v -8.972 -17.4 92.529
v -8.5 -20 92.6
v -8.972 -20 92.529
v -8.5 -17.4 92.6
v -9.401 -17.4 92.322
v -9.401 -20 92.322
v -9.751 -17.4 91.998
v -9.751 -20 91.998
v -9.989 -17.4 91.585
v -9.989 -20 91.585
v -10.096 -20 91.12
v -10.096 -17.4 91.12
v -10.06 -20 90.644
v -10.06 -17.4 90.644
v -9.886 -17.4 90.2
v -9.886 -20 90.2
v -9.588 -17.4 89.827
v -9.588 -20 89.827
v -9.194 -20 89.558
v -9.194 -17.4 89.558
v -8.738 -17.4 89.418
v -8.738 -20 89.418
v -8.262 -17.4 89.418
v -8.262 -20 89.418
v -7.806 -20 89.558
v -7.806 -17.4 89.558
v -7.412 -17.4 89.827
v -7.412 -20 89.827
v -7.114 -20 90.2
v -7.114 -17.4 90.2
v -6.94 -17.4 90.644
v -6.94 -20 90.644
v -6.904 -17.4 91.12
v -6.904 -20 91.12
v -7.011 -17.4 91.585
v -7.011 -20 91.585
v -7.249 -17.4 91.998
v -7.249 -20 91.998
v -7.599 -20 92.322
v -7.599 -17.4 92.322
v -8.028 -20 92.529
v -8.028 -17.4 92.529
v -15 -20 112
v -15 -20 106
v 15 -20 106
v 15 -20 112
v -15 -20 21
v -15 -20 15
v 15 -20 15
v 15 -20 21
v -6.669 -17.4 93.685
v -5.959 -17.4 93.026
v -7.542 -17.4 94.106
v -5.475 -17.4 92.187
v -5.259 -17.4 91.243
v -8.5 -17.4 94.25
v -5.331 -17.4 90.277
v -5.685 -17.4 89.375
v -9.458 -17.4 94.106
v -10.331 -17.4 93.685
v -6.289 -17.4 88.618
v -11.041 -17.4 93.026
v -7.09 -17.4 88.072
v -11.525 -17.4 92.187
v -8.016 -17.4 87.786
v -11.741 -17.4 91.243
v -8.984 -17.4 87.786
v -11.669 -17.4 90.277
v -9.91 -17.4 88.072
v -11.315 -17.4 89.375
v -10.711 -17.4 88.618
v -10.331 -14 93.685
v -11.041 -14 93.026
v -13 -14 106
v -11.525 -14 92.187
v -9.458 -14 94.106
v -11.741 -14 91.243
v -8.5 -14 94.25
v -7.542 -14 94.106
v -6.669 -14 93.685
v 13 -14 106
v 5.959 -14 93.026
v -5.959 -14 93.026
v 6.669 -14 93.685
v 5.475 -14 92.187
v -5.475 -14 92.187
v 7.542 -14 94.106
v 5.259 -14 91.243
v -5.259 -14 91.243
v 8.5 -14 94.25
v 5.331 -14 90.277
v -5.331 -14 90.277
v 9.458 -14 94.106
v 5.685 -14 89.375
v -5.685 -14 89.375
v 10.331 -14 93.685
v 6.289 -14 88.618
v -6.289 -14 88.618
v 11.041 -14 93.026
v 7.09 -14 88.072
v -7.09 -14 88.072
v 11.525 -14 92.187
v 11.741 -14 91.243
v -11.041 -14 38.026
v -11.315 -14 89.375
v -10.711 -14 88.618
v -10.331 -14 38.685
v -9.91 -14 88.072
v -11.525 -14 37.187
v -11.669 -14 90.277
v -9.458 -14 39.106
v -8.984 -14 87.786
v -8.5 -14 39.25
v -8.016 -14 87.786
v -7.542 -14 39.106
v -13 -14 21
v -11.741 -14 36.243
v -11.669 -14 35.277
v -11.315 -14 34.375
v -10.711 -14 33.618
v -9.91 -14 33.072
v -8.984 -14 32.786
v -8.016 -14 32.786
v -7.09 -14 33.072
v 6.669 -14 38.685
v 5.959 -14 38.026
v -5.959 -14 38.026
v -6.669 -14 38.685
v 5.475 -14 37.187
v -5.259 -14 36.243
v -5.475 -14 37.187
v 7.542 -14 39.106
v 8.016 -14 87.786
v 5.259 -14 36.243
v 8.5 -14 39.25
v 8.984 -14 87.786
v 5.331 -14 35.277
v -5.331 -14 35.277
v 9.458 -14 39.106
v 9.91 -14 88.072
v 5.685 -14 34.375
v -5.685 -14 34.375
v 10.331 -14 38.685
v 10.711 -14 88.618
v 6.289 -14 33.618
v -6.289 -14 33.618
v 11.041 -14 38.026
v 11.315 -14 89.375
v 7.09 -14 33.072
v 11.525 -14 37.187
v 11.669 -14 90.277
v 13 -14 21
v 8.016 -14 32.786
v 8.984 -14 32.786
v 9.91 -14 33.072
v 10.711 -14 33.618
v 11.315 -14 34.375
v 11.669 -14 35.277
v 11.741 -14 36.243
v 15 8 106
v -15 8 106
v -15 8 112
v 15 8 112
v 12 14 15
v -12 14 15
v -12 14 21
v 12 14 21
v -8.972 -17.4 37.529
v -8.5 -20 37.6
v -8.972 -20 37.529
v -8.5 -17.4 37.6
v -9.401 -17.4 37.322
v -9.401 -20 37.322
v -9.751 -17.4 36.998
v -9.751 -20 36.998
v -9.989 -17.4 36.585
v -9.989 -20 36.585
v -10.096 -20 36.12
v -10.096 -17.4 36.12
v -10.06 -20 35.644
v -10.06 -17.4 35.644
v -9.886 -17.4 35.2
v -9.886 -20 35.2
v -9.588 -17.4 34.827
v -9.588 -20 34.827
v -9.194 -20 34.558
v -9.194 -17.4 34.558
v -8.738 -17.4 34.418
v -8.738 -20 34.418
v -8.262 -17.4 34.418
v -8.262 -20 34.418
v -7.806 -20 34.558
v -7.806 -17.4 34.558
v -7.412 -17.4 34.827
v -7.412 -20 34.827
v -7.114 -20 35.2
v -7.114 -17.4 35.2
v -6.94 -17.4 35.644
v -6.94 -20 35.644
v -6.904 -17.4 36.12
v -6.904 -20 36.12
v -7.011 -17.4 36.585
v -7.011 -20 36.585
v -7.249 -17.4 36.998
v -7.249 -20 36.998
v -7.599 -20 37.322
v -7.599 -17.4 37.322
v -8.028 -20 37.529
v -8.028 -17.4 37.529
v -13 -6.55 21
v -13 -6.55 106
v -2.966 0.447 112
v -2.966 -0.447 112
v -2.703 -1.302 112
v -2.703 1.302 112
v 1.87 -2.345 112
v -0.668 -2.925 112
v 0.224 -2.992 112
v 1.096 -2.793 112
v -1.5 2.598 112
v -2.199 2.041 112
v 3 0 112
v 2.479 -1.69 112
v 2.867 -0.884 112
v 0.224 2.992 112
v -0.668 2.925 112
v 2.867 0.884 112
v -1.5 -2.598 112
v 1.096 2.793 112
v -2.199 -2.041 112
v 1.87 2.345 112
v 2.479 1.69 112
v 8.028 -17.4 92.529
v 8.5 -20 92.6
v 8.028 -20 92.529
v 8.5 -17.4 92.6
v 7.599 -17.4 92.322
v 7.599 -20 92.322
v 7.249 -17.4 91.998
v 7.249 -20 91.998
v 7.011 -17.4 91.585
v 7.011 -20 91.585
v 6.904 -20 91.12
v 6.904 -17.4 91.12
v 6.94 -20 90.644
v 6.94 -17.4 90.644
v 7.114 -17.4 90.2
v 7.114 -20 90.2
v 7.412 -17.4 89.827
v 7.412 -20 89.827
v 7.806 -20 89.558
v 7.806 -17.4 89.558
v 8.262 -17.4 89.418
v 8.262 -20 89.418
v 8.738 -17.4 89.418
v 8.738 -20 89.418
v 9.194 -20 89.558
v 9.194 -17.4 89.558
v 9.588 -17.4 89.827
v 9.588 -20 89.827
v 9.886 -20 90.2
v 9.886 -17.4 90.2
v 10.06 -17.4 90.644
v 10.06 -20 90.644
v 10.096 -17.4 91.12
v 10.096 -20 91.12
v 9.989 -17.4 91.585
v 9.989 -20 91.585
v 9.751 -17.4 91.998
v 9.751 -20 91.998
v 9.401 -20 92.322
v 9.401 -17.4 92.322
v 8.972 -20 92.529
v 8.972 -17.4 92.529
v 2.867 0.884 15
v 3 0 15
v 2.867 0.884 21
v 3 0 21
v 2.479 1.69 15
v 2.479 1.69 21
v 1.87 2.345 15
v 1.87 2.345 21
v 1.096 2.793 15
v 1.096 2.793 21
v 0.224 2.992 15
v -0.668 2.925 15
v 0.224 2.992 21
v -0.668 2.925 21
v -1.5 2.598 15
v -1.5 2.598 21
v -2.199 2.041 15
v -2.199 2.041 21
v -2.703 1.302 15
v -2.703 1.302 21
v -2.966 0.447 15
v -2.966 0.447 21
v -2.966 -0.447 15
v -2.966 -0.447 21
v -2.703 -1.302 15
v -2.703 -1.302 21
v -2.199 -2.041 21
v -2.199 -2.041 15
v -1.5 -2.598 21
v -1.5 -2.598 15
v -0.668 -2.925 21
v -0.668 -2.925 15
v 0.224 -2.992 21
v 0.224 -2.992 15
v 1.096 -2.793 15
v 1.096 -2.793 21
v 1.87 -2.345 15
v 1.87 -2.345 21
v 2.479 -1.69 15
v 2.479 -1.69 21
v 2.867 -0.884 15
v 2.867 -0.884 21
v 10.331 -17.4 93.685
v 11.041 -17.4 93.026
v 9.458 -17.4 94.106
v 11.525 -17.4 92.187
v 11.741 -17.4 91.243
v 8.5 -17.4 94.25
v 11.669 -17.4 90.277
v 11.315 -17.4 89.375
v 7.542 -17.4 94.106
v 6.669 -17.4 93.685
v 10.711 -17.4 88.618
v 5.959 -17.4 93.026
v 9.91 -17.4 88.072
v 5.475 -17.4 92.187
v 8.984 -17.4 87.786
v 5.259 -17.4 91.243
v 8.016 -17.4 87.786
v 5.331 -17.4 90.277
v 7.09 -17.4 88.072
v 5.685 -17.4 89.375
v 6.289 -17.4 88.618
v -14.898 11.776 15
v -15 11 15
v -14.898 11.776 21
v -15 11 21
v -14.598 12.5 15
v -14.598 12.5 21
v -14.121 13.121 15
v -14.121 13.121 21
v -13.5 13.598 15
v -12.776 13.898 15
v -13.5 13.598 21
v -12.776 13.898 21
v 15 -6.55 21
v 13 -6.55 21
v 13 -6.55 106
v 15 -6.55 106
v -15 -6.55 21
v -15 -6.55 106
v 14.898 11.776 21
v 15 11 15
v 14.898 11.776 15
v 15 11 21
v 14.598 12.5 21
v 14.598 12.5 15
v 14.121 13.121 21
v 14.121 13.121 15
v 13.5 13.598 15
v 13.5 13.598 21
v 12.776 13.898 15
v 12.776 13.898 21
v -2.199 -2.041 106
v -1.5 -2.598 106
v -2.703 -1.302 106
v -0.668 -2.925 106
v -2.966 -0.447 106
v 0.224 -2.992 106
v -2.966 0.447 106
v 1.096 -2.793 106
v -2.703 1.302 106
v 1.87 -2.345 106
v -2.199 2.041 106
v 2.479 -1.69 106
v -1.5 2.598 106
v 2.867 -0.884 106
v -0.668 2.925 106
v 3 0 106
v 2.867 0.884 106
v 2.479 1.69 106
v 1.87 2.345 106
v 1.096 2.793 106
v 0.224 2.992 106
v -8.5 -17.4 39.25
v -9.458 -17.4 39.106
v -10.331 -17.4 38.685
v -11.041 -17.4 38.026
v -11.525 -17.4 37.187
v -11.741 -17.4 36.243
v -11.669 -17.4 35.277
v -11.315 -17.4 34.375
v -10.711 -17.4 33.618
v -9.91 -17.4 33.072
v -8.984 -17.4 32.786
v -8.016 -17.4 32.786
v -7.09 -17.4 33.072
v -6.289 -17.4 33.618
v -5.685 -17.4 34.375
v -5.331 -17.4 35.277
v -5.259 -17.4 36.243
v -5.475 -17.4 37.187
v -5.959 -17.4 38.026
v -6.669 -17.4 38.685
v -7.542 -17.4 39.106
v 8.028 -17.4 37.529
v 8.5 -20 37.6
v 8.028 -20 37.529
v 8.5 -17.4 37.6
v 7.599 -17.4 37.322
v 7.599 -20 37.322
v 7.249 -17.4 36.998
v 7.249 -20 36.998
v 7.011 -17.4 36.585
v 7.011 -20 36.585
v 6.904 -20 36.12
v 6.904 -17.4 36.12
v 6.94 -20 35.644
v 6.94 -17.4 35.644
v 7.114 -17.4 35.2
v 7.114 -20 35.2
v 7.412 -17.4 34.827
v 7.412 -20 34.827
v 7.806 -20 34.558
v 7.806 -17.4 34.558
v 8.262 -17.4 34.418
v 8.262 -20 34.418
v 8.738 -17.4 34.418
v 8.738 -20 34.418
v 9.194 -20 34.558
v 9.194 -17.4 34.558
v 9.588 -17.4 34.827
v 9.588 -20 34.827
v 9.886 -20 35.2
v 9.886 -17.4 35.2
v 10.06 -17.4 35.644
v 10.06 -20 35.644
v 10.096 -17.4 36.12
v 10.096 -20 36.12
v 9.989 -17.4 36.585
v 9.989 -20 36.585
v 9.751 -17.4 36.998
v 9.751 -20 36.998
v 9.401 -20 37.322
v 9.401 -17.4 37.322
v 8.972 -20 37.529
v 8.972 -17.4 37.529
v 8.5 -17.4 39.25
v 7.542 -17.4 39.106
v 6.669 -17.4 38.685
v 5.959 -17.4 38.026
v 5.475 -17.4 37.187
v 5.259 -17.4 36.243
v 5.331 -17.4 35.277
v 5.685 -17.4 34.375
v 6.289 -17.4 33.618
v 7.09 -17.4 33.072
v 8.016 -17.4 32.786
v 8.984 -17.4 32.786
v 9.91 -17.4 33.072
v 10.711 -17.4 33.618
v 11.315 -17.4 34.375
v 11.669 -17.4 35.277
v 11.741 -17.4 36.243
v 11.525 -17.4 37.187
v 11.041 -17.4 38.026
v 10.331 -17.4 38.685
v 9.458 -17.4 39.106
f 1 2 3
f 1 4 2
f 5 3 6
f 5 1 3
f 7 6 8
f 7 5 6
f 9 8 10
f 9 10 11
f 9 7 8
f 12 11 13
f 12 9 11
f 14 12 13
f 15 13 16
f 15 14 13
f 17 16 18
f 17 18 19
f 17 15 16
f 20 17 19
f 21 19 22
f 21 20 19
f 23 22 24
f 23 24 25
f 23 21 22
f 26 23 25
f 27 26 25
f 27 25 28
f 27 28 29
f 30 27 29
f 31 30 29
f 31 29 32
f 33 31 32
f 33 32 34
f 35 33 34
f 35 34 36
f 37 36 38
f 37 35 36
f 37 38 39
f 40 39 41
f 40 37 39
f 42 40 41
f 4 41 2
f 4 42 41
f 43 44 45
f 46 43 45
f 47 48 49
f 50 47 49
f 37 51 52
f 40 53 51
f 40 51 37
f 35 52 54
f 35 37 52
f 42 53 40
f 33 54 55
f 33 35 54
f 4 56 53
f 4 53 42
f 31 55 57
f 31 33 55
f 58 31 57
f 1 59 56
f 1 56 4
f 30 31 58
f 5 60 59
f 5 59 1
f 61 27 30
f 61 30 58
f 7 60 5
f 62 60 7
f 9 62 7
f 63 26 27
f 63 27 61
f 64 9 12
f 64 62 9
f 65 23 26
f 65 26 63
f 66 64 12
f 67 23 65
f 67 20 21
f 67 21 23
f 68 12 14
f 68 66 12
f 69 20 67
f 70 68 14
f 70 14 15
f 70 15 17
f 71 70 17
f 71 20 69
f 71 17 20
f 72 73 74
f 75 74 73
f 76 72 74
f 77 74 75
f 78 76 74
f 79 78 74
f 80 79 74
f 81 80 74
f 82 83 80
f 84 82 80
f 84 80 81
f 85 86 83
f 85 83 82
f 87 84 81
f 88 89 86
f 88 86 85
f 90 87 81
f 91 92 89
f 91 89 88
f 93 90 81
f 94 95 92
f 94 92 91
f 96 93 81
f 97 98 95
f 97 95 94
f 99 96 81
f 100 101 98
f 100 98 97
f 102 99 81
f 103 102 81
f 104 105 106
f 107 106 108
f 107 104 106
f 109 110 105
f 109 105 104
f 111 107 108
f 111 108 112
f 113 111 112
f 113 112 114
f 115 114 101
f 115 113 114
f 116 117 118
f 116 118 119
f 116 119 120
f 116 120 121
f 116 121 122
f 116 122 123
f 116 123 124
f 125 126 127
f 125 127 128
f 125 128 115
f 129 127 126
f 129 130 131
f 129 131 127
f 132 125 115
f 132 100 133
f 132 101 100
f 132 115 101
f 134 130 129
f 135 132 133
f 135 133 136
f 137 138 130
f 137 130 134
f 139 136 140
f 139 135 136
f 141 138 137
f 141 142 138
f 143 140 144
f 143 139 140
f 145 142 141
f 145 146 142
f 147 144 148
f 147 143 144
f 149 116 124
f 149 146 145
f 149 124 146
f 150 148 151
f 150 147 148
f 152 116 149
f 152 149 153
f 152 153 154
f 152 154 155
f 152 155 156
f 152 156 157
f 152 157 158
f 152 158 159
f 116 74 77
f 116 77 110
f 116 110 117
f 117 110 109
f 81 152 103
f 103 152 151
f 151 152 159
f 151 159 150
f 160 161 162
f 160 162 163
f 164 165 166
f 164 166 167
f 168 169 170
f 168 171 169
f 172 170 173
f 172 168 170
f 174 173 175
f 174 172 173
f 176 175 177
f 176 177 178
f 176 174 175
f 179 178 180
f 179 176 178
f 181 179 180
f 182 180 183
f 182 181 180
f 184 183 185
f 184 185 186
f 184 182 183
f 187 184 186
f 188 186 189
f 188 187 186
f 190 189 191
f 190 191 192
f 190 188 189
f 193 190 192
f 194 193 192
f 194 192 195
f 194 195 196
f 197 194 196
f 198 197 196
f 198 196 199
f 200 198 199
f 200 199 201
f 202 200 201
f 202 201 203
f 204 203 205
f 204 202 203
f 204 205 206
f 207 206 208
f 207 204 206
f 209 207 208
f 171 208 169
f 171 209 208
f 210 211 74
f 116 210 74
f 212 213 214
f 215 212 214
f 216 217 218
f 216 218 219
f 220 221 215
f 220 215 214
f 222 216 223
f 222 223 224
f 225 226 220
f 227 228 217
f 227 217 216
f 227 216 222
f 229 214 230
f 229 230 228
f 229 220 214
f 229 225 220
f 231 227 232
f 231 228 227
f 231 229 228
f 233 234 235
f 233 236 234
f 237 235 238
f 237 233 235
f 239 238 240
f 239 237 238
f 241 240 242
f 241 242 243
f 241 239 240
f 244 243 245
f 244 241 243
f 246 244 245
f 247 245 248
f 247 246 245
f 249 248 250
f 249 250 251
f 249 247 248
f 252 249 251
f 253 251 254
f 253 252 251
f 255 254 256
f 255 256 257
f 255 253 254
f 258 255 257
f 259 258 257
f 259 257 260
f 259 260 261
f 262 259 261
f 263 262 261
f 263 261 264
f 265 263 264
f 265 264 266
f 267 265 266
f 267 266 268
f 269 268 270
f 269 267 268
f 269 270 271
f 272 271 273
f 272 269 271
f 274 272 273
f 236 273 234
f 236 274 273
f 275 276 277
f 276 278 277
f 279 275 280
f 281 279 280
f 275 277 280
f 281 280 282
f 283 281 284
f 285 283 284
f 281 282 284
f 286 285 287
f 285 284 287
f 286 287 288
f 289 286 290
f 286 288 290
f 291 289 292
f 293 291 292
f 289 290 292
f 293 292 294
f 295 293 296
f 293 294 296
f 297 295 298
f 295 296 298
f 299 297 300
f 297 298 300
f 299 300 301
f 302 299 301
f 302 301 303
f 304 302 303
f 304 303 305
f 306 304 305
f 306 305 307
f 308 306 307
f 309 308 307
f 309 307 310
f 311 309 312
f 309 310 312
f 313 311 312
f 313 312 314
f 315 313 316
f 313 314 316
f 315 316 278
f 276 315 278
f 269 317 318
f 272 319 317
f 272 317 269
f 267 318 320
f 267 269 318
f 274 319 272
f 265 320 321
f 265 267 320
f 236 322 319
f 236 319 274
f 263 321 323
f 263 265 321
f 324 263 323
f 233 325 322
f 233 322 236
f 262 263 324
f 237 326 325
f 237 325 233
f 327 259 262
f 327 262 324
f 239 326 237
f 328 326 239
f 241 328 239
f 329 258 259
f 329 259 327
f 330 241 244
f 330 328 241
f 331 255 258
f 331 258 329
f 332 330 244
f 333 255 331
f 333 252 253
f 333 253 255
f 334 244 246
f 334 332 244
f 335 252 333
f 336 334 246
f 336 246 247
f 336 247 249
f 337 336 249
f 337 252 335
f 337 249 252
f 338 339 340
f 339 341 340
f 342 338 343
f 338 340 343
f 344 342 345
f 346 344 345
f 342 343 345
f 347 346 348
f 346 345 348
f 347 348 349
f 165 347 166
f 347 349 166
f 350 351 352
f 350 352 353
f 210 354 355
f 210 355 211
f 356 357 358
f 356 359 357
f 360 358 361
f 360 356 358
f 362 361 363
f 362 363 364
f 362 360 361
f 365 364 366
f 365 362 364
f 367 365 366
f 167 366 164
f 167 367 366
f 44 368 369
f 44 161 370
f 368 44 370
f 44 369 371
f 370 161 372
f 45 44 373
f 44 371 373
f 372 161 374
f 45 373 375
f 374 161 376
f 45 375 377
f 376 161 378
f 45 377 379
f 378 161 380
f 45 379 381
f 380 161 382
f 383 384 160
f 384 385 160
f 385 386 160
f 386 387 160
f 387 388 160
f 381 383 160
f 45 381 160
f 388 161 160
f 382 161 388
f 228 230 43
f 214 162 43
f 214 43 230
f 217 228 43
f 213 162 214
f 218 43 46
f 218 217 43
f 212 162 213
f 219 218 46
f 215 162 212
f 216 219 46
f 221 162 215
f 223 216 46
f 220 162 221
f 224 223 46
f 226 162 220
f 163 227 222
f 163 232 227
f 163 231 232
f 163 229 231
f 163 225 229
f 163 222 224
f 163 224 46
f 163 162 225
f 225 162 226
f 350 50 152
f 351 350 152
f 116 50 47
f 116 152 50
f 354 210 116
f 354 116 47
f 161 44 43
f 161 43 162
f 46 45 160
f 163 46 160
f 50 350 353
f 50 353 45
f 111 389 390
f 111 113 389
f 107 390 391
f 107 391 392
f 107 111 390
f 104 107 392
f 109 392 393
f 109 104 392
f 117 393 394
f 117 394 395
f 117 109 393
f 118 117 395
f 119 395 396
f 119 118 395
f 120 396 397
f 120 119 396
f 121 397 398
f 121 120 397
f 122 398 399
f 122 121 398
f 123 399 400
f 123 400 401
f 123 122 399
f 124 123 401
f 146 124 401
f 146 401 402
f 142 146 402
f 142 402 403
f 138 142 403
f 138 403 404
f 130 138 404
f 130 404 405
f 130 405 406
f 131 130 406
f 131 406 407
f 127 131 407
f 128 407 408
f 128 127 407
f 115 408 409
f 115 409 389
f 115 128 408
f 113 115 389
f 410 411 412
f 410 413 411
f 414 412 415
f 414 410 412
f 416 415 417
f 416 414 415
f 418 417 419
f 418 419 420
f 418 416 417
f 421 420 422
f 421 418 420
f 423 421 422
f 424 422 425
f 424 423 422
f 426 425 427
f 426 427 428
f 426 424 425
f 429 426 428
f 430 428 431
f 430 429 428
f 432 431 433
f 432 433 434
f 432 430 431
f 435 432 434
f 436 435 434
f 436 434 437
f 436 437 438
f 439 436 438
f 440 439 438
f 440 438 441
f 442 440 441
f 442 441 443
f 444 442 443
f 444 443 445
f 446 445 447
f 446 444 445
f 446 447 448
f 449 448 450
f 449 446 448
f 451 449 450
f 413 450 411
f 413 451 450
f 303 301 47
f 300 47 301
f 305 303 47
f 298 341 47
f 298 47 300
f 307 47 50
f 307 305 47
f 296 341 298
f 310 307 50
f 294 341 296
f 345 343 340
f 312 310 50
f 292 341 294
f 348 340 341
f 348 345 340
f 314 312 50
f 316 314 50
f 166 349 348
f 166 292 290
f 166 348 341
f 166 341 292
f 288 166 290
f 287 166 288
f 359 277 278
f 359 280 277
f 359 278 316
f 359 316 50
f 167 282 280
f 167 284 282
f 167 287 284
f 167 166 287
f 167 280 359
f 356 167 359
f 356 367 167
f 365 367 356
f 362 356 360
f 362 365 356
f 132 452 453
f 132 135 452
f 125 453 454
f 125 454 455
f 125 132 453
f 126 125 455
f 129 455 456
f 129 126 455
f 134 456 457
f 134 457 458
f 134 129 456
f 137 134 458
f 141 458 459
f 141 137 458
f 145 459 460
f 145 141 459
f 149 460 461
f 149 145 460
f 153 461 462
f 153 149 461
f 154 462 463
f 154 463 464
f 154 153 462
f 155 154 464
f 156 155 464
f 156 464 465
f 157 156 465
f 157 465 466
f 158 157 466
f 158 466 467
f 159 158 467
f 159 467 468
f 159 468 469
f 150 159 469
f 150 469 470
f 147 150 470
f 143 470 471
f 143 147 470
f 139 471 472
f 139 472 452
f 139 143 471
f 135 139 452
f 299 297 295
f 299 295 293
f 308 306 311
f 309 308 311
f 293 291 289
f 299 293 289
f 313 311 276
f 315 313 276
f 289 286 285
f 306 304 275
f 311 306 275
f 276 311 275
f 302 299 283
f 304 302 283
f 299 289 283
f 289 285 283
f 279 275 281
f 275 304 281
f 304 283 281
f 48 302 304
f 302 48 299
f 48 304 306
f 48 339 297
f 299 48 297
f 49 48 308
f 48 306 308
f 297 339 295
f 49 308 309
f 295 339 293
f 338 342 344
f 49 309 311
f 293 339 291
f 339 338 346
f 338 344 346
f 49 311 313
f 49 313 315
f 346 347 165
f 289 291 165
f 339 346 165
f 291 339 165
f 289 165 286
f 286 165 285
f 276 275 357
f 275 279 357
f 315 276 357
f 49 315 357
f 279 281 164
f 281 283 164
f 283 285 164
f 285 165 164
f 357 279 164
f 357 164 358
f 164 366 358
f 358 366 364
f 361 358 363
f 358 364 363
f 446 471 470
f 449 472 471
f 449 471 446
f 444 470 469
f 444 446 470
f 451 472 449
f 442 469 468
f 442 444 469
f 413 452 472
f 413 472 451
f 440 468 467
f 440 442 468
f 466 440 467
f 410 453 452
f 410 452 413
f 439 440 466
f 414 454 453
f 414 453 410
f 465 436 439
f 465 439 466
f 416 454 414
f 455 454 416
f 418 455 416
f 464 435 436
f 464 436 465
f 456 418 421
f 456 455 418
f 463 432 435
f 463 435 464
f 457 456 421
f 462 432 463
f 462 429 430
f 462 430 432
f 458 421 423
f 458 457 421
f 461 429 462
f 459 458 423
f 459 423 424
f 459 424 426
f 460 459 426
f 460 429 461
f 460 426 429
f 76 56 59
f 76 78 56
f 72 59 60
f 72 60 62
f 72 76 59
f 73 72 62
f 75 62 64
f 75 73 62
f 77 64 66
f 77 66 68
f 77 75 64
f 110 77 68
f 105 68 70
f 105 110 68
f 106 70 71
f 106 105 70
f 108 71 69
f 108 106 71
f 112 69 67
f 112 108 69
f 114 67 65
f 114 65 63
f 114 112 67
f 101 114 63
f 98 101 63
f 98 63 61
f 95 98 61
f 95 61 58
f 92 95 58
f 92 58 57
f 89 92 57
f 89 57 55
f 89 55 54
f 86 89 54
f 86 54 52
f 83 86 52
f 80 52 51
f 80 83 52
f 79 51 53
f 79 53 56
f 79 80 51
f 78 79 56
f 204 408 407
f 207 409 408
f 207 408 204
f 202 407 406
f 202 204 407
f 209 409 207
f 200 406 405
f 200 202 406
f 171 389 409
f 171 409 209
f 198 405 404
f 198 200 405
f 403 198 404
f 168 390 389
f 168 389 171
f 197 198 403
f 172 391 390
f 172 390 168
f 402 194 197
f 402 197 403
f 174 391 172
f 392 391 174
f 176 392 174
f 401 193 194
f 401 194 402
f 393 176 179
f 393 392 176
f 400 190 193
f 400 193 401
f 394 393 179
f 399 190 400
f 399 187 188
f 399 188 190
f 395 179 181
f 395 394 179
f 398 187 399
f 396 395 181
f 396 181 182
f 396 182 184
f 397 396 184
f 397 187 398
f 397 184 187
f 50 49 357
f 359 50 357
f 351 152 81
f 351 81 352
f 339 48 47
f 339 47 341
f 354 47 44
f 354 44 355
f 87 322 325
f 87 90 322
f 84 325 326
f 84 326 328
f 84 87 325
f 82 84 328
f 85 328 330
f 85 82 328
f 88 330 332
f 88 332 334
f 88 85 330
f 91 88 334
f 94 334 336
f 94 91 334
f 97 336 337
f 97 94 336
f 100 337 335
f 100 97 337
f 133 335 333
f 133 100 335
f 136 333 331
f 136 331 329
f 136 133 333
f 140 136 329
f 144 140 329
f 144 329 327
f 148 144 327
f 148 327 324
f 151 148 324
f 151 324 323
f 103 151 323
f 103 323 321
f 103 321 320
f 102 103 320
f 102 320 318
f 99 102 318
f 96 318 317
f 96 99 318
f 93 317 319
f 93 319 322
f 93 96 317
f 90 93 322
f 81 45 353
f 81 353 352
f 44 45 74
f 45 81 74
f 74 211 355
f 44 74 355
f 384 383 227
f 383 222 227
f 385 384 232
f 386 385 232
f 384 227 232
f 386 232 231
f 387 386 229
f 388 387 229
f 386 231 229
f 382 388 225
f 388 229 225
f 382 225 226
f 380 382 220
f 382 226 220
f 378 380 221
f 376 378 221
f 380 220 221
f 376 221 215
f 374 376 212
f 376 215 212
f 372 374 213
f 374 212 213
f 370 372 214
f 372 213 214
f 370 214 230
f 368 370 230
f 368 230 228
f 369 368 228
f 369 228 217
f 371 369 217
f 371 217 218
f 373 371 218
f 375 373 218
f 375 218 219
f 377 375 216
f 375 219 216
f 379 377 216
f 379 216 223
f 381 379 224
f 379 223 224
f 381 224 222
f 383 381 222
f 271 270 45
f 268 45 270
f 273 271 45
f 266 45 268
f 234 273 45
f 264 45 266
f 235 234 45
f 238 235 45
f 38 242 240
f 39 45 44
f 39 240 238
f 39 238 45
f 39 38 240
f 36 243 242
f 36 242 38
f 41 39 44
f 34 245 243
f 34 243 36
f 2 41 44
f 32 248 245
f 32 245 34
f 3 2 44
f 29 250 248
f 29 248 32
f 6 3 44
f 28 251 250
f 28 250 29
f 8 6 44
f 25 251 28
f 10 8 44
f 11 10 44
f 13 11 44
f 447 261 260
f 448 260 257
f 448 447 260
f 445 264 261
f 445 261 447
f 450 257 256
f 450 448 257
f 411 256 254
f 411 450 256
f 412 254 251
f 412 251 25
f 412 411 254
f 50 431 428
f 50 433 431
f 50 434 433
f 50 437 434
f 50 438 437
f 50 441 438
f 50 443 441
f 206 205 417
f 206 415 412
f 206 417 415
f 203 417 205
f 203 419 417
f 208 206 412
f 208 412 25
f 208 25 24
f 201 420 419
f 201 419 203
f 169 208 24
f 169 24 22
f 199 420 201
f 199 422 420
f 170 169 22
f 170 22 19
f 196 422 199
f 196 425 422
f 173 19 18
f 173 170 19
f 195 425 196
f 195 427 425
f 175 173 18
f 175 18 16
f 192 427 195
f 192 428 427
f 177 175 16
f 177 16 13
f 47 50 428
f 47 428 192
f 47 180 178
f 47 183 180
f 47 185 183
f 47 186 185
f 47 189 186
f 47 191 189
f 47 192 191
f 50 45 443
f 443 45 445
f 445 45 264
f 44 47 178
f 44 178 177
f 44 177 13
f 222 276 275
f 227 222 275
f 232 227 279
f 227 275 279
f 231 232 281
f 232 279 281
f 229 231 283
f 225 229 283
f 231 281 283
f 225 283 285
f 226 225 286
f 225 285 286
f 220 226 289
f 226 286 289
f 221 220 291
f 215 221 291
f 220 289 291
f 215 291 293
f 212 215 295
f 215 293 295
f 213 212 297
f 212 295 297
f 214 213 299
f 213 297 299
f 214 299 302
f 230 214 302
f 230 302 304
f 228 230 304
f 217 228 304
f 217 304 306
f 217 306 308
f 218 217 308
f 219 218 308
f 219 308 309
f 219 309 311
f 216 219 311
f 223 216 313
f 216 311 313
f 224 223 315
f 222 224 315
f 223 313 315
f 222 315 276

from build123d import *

# Parameters (mm, degrees)
SKETCH1_W                                    = 30
SKETCH1_H                                    = 34
BOSS_EXTRUDE1_DEPTH                          = 6
BOSS_EXTRUDE2_DEPTH                          = 85
SKETCH3_W                                    = 30
SKETCH3_H                                    = 28
BOSS_EXTRUDE3_DEPTH                          = 6
FILLET1_R                                    = 3
SKETCH4_R                                    = 3
CUT_EXTRUDE1_DEPTH                           = 92
CUT_EXTRUDE1_DEPTH_BACK                      = 7
BOSS_EXTRUDE4_START                          = -6
SKETCH4_2_R                                  = 3
BOSS_EXTRUDE4_DEPTH                          = 97
CBORE_FOR_M3_HEX_SOCKET_HEAD_CAP_SCR_2_COUNT = 2
CBORE_FOR_M3_HEX_SOCKET_HEAD_CAP_SCR_2_PITCH = 17
CBORE_FOR_M3_HEX_SOCKET_HEAD_CAP_SCR_3_COUNT = 2
CBORE_FOR_M3_HEX_SOCKET_HEAD_CAP_SCR_3_PITCH = 57.567351858
CBORE_FOR_M3_HEX_SOCKET_HEAD_CAP_SCR_4_COUNT = 2
CBORE_FOR_M3_HEX_SOCKET_HEAD_CAP_SCR_4_PITCH = 55


with BuildPart() as part:
    # Sketch1 → Boss-Extrude1 (new body)
    with BuildSketch(Plane.XY.offset(15)):
        with Locations((0, -3)):
            Rectangle(SKETCH1_W, SKETCH1_H)
    extrude(amount=BOSS_EXTRUDE1_DEPTH)

    # Fillet1
    fillet1_edges = [part.edges().sort_by_distance(p)[0] for p in [
        (-15, 14, 18),
        (15, 14, 18),
    ]]
    fillet(fillet1_edges, radius=FILLET1_R)


with BuildPart() as body_2:
    # Sketch2 → Boss-Extrude2 (new body)
    with BuildSketch(Plane.XY.offset(21)):
        Polygon((-15, -6.55), (-13, -6.55), (-13, -14), (13, -14), (13, -6.55), (15, -6.55), (15, -20), (-15, -20), align=None)
    extrude(amount=BOSS_EXTRUDE2_DEPTH)

    # Sketch7 → CBORE for M3 Hex Socket Head Cap Screw1 (revolve, cut)
    with BuildSketch(Plane(origin=(-8.5, -14, 36), x_dir=(0, 0, 1), z_dir=(1, 0, 0))):
        Polygon((0, 0), (0, 6), (1.6, 6), (1.6, 3.4), (3.25, 3.4), (3.25, 0), align=None)
    cbore_for_m3_hex_socket_head_cap_screw1 = revolve(axis=Axis((-8.5, -7.65, 36), (0, -1, 0)), mode=Mode.SUBTRACT)

    # CBORE for M3 Hex Socket Head Cap Scr 2: CBORE for M3 Hex Socket Head Cap Screw1 ×2
    with Locations(*[(i * CBORE_FOR_M3_HEX_SOCKET_HEAD_CAP_SCR_2_PITCH, 0, 0) for i in range(1, CBORE_FOR_M3_HEX_SOCKET_HEAD_CAP_SCR_2_COUNT)]):
        add(cbore_for_m3_hex_socket_head_cap_screw1, mode=Mode.SUBTRACT)

    # CBORE for M3 Hex Socket Head Cap Scr 3: CBORE for M3 Hex Socket Head Cap Screw1 ×2
    with Locations(*[Vector(0.295306271, 0, 0.955402641) * (i * CBORE_FOR_M3_HEX_SOCKET_HEAD_CAP_SCR_3_PITCH) for i in range(1, CBORE_FOR_M3_HEX_SOCKET_HEAD_CAP_SCR_3_COUNT)]):
        add(cbore_for_m3_hex_socket_head_cap_screw1, mode=Mode.SUBTRACT)

    # CBORE for M3 Hex Socket Head Cap Scr 4: CBORE for M3 Hex Socket Head Cap Screw1 ×2
    with Locations(*[(0, 0, i * CBORE_FOR_M3_HEX_SOCKET_HEAD_CAP_SCR_4_PITCH) for i in range(1, CBORE_FOR_M3_HEX_SOCKET_HEAD_CAP_SCR_4_COUNT)]):
        add(cbore_for_m3_hex_socket_head_cap_screw1, mode=Mode.SUBTRACT)


with BuildPart() as body_3:
    # Sketch3 → Boss-Extrude3 (new body)
    with BuildSketch(Plane.XY.offset(106)):
        with Locations((0, -6)):
            Rectangle(SKETCH3_W, SKETCH3_H)
    extrude(amount=BOSS_EXTRUDE3_DEPTH)


with BuildPart() as cut_extrude1_tool:
    # Sketch4 → Cut-Extrude1 (new body, two sides)
    with BuildSketch(Plane.XY.offset(21)) as cut_extrude1_sk:
        Circle(SKETCH4_R)
    extrude(amount=CUT_EXTRUDE1_DEPTH)
    extrude(cut_extrude1_sk.sketch, amount=-CUT_EXTRUDE1_DEPTH_BACK)


with BuildPart() as part_1:
    add(part.part)

    # Cut-Extrude1: cut by cut_extrude1_tool
    add(cut_extrude1_tool.part, mode=Mode.SUBTRACT)


with BuildPart() as body_3_1:
    add(body_3.part)

    # Cut-Extrude1: cut by cut_extrude1_tool
    add(cut_extrude1_tool.part, mode=Mode.SUBTRACT)


with BuildPart() as body_4:
    # Sketch4<2> → Boss-Extrude4 (new body)
    with BuildSketch(Plane.XY.offset(21).offset(BOSS_EXTRUDE4_START)):
        Circle(SKETCH4_2_R)
    extrude(amount=BOSS_EXTRUDE4_DEPTH)


solid = Compound([body_2.part, part_1.part, body_3_1.part, body_4.part])
